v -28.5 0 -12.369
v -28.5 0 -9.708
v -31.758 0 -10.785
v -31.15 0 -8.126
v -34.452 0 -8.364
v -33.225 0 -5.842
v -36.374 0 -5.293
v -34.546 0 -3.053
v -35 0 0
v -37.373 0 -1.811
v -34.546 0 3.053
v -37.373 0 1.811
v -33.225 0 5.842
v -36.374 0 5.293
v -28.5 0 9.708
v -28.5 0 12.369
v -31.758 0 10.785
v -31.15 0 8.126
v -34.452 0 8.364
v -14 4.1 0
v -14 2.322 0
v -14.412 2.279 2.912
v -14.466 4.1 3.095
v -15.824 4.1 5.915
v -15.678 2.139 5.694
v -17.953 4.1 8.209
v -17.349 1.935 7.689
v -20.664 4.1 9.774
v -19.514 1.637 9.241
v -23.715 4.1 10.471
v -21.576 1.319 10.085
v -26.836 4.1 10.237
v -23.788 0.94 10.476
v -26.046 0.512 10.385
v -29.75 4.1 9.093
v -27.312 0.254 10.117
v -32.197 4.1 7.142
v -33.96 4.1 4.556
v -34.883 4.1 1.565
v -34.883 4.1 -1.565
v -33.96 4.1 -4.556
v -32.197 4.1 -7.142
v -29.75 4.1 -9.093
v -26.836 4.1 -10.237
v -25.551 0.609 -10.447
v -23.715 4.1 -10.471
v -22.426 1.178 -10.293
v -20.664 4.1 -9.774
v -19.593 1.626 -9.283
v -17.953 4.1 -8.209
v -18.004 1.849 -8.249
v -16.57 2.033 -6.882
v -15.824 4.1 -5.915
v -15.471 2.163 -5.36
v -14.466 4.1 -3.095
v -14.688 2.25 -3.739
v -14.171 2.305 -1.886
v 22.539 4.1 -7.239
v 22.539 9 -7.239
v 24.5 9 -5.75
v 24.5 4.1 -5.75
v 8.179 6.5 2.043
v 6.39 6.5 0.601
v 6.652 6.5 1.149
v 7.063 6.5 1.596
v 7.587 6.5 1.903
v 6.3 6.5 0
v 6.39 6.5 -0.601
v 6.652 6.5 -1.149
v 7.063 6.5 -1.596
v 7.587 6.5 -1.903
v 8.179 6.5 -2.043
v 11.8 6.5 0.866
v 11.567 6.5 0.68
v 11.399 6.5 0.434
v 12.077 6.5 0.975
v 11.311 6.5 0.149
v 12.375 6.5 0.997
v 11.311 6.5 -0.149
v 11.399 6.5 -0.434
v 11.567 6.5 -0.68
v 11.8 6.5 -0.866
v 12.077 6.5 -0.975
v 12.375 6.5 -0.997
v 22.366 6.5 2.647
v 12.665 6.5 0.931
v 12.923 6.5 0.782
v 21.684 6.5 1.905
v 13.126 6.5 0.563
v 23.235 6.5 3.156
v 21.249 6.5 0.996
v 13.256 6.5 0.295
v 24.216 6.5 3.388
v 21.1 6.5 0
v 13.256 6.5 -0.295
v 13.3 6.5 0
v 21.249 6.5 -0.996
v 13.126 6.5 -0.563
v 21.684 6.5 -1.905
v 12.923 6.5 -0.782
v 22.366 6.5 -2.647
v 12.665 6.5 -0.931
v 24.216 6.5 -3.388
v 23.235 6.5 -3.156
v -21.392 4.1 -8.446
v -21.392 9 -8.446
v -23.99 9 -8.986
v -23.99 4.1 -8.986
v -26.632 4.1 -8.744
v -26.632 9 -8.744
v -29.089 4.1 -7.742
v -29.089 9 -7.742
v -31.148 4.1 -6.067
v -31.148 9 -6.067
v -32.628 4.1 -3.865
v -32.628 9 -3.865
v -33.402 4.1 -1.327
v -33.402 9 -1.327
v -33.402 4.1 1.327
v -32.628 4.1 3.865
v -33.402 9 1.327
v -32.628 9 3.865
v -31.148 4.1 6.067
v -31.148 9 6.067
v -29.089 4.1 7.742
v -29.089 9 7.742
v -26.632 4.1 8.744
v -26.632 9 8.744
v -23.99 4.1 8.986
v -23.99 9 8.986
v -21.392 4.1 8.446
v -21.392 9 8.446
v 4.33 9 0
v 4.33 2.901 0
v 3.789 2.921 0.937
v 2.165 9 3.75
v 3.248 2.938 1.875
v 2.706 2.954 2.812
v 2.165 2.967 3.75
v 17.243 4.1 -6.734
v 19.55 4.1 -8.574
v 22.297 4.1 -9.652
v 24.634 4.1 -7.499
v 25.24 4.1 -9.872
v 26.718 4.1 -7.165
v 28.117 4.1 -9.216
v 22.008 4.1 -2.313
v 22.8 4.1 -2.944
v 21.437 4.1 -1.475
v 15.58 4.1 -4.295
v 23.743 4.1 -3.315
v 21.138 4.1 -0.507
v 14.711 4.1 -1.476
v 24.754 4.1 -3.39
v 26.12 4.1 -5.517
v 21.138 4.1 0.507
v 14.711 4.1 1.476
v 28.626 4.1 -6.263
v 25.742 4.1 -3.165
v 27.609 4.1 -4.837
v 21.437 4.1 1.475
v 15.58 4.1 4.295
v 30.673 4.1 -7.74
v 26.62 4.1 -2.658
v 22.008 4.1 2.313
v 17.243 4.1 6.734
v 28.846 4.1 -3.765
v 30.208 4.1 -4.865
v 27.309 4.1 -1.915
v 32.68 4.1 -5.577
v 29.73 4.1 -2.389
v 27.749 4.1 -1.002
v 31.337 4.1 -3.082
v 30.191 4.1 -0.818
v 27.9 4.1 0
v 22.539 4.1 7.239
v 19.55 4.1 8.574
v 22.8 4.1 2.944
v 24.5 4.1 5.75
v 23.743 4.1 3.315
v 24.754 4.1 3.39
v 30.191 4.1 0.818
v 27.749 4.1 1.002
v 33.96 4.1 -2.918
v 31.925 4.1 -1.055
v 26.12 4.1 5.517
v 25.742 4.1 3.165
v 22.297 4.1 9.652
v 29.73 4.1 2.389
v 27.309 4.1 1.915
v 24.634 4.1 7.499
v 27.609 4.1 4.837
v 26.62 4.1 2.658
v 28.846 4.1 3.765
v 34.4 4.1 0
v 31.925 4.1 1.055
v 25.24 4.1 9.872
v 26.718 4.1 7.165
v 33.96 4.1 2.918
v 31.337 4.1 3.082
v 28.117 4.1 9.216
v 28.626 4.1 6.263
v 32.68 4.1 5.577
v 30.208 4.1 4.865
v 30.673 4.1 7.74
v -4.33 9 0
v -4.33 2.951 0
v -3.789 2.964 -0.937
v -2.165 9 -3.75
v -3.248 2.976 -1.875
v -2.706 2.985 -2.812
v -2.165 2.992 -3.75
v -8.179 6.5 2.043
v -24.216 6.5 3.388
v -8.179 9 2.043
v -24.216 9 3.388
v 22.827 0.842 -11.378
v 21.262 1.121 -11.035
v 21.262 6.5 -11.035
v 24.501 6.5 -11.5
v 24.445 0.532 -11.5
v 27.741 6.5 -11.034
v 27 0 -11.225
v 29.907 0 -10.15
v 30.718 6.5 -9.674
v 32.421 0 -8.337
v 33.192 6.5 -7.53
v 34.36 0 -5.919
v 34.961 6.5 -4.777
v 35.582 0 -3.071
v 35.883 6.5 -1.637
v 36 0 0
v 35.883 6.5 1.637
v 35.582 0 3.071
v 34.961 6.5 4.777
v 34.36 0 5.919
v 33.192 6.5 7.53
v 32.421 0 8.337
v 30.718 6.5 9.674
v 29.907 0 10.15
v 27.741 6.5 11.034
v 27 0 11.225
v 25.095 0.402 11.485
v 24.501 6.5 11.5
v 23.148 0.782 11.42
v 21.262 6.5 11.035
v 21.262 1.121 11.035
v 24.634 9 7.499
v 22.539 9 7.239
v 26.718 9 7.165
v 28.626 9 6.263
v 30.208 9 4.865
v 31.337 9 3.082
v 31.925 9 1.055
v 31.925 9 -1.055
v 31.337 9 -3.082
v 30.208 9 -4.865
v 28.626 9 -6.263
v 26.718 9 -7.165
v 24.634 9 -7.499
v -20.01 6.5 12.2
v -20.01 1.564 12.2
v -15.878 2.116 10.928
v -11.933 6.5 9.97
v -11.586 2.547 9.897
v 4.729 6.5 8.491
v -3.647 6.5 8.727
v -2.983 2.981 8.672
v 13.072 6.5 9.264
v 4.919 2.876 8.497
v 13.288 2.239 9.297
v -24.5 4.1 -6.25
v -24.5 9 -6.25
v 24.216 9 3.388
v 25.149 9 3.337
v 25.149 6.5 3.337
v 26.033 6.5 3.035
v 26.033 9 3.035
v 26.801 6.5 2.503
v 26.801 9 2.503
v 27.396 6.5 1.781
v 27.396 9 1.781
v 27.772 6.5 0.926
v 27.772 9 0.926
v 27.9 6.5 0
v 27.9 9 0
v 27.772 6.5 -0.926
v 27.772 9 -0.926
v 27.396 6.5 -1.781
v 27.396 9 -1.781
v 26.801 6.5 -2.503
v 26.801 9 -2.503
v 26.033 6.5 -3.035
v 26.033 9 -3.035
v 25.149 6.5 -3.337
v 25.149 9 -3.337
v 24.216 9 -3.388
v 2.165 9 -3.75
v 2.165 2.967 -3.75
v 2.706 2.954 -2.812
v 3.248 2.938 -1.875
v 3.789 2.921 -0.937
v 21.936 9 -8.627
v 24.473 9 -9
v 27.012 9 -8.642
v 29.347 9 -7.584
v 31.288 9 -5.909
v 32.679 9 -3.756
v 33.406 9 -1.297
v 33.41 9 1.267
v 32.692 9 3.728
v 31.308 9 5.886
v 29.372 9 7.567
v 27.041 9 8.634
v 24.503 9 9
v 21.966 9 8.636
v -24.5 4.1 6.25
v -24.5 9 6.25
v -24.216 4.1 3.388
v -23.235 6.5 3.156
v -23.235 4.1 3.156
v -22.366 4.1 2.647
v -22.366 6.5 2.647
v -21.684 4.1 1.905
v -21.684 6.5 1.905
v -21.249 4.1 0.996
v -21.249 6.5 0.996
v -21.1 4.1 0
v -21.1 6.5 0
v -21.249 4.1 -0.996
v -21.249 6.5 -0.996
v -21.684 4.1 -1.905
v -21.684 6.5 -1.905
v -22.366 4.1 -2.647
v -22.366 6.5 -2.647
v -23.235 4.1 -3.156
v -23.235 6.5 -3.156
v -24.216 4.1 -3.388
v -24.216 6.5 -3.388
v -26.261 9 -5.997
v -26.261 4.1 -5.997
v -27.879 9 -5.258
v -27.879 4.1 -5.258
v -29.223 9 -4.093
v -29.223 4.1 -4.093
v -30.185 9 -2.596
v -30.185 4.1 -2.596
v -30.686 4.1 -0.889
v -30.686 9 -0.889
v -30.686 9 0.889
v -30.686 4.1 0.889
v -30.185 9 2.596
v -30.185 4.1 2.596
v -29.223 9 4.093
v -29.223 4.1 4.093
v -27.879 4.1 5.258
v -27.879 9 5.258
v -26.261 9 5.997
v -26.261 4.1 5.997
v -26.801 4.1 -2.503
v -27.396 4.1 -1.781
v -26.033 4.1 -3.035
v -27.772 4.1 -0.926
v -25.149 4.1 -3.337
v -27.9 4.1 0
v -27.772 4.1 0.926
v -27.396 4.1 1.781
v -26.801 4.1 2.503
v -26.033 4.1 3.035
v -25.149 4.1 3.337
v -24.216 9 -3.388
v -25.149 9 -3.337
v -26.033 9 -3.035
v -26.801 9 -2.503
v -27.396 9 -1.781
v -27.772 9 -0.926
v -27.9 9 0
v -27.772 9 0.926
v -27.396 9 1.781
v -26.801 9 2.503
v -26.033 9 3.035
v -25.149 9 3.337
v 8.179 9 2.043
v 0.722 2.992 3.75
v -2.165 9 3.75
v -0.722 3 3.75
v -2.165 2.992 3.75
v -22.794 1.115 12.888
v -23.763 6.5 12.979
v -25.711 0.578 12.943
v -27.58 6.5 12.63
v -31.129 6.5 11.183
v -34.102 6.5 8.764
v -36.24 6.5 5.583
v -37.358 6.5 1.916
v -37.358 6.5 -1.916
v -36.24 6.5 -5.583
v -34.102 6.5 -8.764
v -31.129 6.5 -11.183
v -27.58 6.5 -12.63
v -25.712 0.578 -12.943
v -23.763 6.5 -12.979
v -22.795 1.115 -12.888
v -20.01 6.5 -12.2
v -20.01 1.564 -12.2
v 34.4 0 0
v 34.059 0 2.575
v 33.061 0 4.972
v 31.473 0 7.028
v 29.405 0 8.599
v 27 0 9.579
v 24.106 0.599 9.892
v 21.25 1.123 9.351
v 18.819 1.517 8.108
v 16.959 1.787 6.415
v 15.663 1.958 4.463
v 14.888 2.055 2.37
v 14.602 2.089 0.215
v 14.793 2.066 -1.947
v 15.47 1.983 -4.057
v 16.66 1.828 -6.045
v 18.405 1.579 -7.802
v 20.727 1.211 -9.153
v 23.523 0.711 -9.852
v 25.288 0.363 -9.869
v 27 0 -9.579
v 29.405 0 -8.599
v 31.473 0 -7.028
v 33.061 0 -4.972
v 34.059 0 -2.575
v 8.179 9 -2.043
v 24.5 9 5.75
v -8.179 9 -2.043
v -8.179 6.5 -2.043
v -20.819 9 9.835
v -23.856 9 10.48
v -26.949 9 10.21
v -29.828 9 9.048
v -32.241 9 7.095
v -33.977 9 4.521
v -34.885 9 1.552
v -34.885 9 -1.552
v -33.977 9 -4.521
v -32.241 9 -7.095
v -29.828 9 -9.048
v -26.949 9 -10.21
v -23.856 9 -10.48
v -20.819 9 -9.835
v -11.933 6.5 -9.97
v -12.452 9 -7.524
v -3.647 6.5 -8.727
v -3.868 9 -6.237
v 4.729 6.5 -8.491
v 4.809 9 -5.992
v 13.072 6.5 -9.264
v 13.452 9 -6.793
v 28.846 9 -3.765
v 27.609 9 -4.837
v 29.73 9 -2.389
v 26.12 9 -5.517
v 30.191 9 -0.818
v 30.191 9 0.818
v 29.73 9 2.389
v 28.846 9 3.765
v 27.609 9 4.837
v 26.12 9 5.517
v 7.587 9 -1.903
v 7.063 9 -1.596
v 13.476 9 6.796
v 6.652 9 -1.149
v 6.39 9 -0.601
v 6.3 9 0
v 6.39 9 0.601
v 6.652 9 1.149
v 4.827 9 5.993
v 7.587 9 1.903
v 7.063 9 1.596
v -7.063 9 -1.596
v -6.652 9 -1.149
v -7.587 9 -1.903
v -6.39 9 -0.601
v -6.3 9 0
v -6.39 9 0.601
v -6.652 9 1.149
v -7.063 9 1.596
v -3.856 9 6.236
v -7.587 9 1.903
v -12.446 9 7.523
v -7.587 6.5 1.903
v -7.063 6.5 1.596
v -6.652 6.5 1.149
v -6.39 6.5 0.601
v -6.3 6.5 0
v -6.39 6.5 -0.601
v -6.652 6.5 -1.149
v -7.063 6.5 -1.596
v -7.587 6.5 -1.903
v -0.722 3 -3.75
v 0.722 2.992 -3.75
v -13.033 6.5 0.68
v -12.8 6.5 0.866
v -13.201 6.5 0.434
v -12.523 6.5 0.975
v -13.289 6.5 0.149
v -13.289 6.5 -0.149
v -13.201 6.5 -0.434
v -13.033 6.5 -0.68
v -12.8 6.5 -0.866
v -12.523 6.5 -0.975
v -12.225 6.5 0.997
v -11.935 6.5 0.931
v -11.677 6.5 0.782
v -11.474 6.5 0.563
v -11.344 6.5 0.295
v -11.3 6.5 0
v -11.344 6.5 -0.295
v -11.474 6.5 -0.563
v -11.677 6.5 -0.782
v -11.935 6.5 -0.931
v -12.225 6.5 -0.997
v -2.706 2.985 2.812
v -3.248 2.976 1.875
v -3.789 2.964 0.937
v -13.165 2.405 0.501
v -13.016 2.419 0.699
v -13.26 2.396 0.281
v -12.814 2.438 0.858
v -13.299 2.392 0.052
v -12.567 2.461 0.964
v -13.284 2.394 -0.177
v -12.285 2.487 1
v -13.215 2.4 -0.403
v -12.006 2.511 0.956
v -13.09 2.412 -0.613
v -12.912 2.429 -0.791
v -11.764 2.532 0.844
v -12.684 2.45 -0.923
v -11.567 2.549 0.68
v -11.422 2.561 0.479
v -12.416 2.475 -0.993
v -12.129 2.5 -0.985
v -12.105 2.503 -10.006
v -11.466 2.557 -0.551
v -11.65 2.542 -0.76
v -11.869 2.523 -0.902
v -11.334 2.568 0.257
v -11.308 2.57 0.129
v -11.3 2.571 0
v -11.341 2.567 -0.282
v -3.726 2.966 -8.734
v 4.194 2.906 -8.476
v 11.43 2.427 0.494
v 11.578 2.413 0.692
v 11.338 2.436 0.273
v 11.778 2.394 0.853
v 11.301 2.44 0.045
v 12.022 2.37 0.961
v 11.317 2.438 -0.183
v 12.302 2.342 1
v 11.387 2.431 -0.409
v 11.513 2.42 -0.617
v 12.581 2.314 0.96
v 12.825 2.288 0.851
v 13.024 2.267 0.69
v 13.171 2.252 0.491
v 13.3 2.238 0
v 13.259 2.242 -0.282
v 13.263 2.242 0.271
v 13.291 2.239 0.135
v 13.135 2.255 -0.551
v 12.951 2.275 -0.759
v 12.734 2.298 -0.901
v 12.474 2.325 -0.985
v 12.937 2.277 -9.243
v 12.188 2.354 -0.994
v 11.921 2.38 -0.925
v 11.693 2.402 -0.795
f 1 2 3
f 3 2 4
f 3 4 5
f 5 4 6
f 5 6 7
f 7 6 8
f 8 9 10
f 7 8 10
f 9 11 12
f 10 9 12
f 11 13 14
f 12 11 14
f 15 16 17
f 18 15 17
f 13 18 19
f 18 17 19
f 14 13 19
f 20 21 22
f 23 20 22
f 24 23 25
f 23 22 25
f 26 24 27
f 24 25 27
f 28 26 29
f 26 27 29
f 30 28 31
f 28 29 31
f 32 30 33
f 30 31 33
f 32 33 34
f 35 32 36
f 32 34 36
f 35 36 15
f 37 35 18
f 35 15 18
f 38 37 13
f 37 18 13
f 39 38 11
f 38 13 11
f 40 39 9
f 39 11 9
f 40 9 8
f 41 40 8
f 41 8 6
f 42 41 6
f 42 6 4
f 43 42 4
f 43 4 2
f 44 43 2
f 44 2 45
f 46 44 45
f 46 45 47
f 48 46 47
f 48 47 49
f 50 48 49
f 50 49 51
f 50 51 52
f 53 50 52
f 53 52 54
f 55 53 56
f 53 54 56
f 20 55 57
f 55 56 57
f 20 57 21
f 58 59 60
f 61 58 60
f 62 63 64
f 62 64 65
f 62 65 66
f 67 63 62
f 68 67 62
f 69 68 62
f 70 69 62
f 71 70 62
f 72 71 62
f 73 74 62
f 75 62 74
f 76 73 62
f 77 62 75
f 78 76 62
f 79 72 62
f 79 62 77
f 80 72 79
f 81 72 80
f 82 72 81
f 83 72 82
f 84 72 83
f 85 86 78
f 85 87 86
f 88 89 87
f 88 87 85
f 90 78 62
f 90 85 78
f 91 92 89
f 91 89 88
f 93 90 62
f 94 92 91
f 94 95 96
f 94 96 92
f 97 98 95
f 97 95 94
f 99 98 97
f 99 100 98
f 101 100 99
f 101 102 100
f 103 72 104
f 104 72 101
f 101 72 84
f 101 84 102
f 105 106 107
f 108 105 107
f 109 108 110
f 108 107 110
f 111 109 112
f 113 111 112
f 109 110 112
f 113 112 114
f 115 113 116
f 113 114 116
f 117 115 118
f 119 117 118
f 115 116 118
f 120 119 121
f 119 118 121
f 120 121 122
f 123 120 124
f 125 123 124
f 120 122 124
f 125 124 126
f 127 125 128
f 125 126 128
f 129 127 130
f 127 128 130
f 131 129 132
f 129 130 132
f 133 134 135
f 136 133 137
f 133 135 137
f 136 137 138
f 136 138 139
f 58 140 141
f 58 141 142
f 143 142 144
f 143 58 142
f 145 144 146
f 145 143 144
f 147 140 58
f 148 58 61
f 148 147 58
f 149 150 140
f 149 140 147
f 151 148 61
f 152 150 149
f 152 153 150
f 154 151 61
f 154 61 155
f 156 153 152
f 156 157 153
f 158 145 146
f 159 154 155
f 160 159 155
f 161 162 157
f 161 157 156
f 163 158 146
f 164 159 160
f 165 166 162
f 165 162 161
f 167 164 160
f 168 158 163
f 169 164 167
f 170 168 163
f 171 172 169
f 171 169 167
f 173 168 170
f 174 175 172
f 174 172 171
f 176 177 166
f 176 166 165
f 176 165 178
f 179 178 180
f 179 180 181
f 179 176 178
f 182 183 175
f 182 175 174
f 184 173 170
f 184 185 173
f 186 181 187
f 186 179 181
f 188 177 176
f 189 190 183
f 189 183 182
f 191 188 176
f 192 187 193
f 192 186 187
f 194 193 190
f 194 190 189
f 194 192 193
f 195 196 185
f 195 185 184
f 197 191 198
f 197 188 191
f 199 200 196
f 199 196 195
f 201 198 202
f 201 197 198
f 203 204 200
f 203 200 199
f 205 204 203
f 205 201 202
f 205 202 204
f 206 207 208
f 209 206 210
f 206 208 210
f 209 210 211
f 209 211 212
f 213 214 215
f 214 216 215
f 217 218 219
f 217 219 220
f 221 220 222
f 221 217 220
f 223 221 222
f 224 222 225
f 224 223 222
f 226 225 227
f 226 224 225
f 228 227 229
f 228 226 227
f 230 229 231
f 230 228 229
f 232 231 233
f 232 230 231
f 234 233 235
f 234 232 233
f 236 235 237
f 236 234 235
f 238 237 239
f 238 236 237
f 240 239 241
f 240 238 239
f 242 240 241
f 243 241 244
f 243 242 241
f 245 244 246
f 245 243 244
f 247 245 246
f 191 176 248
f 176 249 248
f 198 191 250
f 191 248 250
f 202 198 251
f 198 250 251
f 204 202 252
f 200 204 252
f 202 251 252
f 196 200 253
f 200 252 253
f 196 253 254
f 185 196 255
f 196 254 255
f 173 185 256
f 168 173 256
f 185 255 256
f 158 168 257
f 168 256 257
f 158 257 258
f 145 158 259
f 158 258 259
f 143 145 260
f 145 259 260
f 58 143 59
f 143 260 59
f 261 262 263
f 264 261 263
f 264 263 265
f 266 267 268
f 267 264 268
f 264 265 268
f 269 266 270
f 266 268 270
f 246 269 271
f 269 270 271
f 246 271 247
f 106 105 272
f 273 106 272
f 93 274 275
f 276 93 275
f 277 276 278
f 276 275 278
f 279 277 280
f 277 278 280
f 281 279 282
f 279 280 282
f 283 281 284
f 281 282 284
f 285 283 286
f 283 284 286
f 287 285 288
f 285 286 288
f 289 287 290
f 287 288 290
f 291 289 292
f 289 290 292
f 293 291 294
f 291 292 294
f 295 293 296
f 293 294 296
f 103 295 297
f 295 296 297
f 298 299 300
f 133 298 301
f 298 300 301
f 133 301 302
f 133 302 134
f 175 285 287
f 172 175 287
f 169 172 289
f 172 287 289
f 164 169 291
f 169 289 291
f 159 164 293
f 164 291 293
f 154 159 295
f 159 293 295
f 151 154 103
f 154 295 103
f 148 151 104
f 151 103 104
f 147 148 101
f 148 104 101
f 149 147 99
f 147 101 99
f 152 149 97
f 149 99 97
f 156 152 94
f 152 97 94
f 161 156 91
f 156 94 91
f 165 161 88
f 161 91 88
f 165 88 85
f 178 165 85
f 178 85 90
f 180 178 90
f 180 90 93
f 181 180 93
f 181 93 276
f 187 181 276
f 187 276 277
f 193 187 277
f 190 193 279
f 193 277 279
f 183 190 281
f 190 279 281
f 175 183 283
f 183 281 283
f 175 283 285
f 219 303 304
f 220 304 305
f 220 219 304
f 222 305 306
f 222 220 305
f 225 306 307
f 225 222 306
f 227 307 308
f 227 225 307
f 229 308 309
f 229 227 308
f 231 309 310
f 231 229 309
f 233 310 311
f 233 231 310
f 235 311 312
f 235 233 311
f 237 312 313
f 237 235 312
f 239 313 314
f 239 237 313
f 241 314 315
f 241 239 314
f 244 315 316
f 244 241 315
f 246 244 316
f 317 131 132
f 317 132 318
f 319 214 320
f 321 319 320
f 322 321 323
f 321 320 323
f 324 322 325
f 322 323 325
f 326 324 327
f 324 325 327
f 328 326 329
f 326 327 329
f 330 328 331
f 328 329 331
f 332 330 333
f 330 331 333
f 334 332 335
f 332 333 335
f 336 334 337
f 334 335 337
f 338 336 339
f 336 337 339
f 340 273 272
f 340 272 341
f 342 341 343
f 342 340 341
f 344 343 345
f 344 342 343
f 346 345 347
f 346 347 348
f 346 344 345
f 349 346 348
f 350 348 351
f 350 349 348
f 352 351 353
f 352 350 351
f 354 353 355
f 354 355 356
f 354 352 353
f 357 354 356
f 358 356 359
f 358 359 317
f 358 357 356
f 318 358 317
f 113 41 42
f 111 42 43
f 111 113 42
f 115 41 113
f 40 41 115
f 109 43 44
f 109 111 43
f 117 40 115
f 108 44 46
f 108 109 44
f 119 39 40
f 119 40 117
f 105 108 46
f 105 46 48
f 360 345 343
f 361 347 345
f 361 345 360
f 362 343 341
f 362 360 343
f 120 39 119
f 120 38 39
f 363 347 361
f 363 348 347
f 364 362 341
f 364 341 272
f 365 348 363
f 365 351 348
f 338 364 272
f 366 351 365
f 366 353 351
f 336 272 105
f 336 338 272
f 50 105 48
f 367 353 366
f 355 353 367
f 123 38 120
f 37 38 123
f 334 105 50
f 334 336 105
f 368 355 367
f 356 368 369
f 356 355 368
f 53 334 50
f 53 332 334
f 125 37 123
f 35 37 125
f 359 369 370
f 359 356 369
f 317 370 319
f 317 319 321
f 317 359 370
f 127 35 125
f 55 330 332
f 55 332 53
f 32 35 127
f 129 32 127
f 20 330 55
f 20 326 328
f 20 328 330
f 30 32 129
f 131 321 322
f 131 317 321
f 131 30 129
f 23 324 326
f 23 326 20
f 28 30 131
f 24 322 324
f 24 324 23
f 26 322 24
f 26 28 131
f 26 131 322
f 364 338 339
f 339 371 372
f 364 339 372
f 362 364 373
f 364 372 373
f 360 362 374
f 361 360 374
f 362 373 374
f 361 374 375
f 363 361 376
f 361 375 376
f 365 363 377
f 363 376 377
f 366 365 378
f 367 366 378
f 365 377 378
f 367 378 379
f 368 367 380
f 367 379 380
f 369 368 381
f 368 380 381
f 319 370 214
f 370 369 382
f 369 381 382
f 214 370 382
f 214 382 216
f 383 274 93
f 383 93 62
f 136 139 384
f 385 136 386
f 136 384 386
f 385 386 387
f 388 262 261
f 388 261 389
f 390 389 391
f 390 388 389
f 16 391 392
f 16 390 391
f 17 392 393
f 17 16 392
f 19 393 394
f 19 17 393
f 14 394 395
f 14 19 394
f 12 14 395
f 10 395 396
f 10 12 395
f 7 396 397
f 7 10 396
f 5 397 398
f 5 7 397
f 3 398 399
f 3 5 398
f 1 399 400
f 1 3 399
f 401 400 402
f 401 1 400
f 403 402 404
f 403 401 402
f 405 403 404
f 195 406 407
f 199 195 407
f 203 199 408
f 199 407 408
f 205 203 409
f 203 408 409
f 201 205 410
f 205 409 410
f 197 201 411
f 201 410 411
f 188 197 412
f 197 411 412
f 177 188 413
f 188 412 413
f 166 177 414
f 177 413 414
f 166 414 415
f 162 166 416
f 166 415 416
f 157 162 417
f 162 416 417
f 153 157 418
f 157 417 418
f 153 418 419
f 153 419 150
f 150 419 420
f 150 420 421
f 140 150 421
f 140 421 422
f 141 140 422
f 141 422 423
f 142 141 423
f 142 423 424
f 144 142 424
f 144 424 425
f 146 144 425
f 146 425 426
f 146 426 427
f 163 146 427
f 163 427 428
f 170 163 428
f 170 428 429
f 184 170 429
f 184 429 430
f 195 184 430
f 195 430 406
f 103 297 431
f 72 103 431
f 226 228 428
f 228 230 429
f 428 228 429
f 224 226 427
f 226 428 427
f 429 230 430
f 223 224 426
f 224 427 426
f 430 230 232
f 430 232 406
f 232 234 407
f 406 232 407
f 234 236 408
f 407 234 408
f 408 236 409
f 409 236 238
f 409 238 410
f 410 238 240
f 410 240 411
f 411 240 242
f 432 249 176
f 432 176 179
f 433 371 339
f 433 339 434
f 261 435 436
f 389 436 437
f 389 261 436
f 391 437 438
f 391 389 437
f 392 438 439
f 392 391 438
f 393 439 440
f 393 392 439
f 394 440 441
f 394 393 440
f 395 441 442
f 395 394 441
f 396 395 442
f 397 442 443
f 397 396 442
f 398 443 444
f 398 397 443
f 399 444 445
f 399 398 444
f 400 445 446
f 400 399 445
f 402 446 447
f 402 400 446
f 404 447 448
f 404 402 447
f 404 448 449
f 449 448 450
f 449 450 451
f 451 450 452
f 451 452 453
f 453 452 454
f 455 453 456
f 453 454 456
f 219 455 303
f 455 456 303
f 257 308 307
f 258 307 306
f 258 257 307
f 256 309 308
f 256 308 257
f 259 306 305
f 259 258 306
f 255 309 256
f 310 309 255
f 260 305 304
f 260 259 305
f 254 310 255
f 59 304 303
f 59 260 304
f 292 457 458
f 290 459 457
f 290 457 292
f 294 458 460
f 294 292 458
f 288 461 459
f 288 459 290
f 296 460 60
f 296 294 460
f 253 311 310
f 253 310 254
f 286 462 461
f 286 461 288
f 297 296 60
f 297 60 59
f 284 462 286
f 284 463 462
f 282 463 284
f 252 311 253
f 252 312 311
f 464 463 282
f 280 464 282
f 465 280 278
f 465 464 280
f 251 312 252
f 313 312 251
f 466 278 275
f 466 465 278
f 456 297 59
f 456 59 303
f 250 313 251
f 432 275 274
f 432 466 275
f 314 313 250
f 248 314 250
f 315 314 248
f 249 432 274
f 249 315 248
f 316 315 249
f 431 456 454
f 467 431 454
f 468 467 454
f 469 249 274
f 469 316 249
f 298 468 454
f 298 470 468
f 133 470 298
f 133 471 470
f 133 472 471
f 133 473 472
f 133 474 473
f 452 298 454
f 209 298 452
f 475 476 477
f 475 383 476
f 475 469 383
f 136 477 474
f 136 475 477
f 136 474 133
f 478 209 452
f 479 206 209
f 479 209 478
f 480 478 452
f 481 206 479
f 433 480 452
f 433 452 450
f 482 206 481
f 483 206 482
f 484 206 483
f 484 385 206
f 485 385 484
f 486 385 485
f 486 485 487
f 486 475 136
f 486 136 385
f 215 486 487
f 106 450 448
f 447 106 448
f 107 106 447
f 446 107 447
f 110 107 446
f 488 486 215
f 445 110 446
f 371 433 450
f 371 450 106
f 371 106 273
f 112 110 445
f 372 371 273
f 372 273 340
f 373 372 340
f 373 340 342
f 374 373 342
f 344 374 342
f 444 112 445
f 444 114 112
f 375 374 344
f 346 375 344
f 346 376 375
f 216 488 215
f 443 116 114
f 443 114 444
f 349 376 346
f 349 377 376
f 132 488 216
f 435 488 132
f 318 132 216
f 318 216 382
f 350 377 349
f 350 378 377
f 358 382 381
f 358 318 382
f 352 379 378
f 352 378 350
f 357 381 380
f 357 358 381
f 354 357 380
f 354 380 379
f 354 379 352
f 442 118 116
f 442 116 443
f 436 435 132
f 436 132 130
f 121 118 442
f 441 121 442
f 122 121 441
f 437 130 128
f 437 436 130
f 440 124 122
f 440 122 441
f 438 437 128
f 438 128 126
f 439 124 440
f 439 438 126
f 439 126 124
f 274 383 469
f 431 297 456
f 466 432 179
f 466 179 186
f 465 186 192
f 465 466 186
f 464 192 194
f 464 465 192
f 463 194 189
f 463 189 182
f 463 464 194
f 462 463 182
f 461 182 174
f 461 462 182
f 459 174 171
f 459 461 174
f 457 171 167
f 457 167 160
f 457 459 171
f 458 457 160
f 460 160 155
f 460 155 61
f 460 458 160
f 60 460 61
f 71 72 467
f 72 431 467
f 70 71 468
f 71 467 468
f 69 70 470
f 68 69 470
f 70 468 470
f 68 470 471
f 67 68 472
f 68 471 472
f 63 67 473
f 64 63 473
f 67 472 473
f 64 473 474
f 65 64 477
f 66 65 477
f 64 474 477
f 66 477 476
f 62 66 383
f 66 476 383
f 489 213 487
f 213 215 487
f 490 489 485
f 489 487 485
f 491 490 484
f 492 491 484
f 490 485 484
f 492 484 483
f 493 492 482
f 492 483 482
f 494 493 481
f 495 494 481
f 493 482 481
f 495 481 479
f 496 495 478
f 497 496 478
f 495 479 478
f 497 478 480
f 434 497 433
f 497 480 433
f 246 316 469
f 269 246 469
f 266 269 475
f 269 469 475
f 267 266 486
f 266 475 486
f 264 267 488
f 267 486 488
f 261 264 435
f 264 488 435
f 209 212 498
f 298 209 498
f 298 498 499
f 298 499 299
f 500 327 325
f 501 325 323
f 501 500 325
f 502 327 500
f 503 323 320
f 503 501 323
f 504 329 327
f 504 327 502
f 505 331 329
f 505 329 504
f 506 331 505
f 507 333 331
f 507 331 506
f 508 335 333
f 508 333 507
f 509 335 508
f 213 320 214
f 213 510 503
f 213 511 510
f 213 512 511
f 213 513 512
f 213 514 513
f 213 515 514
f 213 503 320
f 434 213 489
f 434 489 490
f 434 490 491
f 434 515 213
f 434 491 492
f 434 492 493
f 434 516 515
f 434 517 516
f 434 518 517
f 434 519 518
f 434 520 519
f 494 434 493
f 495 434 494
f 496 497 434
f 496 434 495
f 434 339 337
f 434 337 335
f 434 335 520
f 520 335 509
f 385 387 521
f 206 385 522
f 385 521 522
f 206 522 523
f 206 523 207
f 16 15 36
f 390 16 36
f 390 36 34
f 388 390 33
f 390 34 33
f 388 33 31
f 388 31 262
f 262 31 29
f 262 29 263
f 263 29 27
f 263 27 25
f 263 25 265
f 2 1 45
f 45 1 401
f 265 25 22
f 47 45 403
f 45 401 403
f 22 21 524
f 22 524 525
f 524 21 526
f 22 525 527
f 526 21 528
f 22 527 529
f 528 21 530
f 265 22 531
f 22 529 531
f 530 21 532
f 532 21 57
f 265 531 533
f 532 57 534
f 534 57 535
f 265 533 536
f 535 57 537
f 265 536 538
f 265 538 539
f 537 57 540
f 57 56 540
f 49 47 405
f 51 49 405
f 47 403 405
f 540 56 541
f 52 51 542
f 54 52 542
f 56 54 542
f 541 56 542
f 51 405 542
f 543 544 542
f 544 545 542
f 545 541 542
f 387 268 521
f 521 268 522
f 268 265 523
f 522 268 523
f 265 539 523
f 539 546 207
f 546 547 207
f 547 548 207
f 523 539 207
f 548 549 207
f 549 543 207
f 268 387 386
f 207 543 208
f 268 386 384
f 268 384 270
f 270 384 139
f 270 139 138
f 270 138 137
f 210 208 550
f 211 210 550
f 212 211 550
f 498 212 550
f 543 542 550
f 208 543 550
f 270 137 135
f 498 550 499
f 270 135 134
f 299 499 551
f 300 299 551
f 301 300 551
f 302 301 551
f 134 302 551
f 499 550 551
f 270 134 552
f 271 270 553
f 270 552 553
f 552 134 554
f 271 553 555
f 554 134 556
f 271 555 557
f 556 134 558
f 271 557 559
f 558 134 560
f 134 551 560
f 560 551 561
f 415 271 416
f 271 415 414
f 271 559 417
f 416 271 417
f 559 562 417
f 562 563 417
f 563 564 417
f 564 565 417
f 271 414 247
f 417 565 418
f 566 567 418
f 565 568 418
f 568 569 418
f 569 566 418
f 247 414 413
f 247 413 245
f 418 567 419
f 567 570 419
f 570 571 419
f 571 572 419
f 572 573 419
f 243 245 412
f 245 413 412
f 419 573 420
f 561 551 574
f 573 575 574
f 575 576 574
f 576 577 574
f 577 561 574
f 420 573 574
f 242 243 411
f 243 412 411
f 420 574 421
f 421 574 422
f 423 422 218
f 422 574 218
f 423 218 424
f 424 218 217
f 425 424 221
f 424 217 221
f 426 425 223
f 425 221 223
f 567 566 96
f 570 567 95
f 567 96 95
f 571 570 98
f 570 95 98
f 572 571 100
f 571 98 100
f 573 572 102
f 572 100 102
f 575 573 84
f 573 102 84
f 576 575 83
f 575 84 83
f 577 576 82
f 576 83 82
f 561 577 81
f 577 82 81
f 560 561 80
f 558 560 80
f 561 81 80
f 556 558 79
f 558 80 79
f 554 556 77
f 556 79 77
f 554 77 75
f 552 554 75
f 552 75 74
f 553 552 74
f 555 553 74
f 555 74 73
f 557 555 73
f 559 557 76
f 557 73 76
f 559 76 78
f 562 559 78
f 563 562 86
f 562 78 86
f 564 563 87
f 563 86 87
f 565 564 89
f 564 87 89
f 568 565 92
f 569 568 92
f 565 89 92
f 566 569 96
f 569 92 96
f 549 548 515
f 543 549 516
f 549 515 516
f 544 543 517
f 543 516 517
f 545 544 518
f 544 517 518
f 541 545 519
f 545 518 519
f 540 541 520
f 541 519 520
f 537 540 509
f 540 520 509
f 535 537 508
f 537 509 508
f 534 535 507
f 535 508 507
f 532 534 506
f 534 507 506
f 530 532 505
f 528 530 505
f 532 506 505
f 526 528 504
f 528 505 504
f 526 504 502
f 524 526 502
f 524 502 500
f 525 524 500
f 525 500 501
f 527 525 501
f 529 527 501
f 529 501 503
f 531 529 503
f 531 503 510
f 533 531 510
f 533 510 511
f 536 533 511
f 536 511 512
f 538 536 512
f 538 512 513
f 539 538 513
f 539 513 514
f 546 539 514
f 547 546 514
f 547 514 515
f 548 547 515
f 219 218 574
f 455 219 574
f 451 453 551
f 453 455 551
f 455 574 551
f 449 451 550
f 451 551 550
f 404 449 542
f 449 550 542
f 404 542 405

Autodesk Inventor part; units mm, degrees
ref_plane "YZ Plane" through (0, 0, 0) normal (1, 0, 0) x (0, 1, 0)
ref_plane "XZ Plane" through (0, 0, 0) normal (0, 1, 0) x (-1, 0, 0)
ref_plane "XY Plane" through (0, 0, 0) normal (0, 0, 1) x (1, 0, 0)
sketch "Boceto1" plane through (0, 0, 0) normal (0, 1, 0) x (-1, 0, 0)
  arc A0 (20.01, -12.2) -> (20.01, 12.2) centre (24.5, 0) ccw
  arc A1 (-21.2615, 11.0346) -> (-21.2615, -11.0346) centre (-24.5, 0) ccw
  line L0 (-2.1651, 3.75) -> (2.1651, 3.75)
  line L1 (2.1651, 3.75) -> (4.3301, 0)
  line L2 (4.3301, 0) -> (2.1651, -3.75)
  line L3 (2.1651, -3.75) -> (-2.1651, -3.75)
  line L4 (-2.1651, -3.75) -> (-4.3301, 0)
  line L5 (-4.3301, 0) -> (-2.1651, 3.75)
  line L6 (0, 0) -> (0, 8.5) construction
  line L7 (0, 0) -> (0, -8.5) construction
  line L8 (0, 0) -> (2.6275, 0) construction
  arc A2 (20.01, -12.2) -> (-21.4933, -11.1) centre (-2.4996, -77.9761) ccw
  arc A3 (-21.4933, 11.1) -> (20.01, 12.2) centre (-2.4996, 77.9761) ccw
  arc A4 (20.01, 12.2) -> (20.01, -12.2) centre (24.5, 0) ccw construction
  arc A5 (-21.2615, -11.0346) -> (-21.2615, 11.0346) centre (-24.5, 0) ccw construction
  point P0 (-21.4933, 11.1)
  dimension "d2" = 7.5
  dimension "d3" = 49
  dimension "d4" = 8.5
  dimension "d5" = 8.5
  dimension "d6" = 26
  dimension "d7" = 23
  dimension "d12" = 12.2
  dimension "d13" = 11.1
extrude "Extrusión1" add sketch "Boceto1" along normal blind 9
sketch "Boceto2" plane through (0, 9, 0) normal (0, 1, 0) x (1, 0, 0)
  arc A0 (-20.01, 12.2) -> (-20.01, -12.2) centre (-24.5, 0) ccw projected
  arc A1 (21.4933, -11.1) -> (21.4933, 11.1) centre (24.5, 0) ccw projected
  arc A2 (-24.5, 6.25) -> (-24.5, -6.25) centre (-24.5, 0) ccw
  arc A3 (24.5, -5.75) -> (24.5, 5.75) centre (24.5, 0) ccw
  arc A4 (-21.3915, 8.4462) -> (-21.3915, -8.4462) centre (-24.5, 0) ccw
  arc A5 (22.5391, -7.2391) -> (22.5391, 7.2391) centre (24.5, 0) ccw
  line L0 (-21.3915, 8.4462) -> (-24.5, 6.25)
  line L1 (-21.3915, -8.4462) -> (-24.5, -6.25)
  arc A6 (-24.5, -6.25) -> (-24.5, 6.25) centre (-24.5, 0) ccw construction
  line L2 (22.5391, 7.2391) -> (24.5, 5.75)
  line L3 (22.5391, -7.2391) -> (24.5, -5.75)
  arc A7 (24.5, 5.75) -> (24.5, -5.75) centre (24.5, 0) ccw construction
  point P0 (0, 0)
  dimension "d16" = 12.5
  dimension "d17" = 11.5
  dimension "d18" = 4
  dimension "d19" = 4
extrude "Extrusión2" cut sketch "Boceto2" against normal up to surface (9 mm away)
sketch "Boceto3" plane through (0, 9, 0) normal (0, 1, 0) x (1, 0, 0)
  arc A0 (-24.5, 6.25) -> (-24.5, -6.25) centre (-24.5, 0) ccw projected
  arc A1 (24.5, -5.75) -> (24.5, 5.75) centre (24.5, 0) ccw projected
  arc A2 (-24.2158, 3.3881) -> (-24.2158, -3.3881) centre (-24.5, 0) ccw
  arc A3 (-8.1786, -2.0428) -> (-8.1786, 2.0428) centre (-8.35, 0) ccw
  line L0 (-27.9, 3.184) -> (-27.9, -2.3152) construction
  line L1 (-6.3, 2.5123) -> (-6.3, -1.5596) construction
  line L2 (0, 0) -> (0, -2.3152) construction
  line L3 (-24.2158, 3.3881) -> (-8.1786, 2.0428)
  line L4 (-24.2158, -3.3881) -> (-8.1786, -2.0428)
  arc A4 (24.2158, -3.3881) -> (24.2158, 3.3881) centre (24.5, 0) ccw
  arc A5 (8.1786, 2.0428) -> (8.1786, -2.0428) centre (8.35, 0) ccw
  line L5 (24.2158, 3.3881) -> (8.1786, 2.0428)
  line L6 (24.2158, -3.3881) -> (8.1786, -2.0428)
  arc A6 (-24.2158, -3.3881) -> (-24.2158, 3.3881) centre (-24.5, 0) ccw construction
  arc A7 (-8.1786, 2.0428) -> (-8.1786, -2.0428) centre (-8.35, 0) ccw construction
  arc A8 (8.1786, -2.0428) -> (8.1786, 2.0428) centre (8.35, 0) ccw construction
  arc A9 (24.2158, 3.3881) -> (24.2158, -3.3881) centre (24.5, 0) ccw construction
  dimension "d22" = 6.8
  dimension "d28" = 4.1
  dimension "d30" = 21.6
extrude "Extrusión3" cut sketch "Boceto3" against normal blind 2.5
sketch "Boceto4" plane through (0, 6.5, 0) normal (0, 1, 0) x (1, 0, 0)
  arc A0 (-24.2158, 3.3881) -> (-24.2158, -3.3881) centre (-24.5, 0) ccw projected
  line L0 (0, 0) -> (0, -3.3881) construction
  arc A1 (-24.2158, 3.3881) -> (-24.2158, -3.3881) centre (-24.5, 0) ccw projected
  circle A2 centre (-24.5, 0) radius 3.4
  circle A3 centre (-12.3, 0) radius 1
  circle A4 centre (24.5, 0) radius 3.4
  circle A5 centre (12.3, 0) radius 1
  point P0 (-24.2158, -3.3881)
  dimension "d33" = 6.8
  dimension "d34" = 2
  dimension "d35" = 12.2
extrude "Extrusión4" cut sketch "Boceto4" against normal up to surface (6.5 mm away)
sketch "Boceto5" plane through (0, 0, 0) normal (0, -1, 0) x (1, 0, 0)
  circle A0 centre (24.5, 0) radius 3.4 projected
  circle A1 centre (-24.5, 0) radius 3.4 projected
  circle A2 centre (24.5, 0) radius 9.9
  circle A3 centre (-24.5, 0) radius 10.5
  point P0 (0, 0)
  dimension "d38" = 19.8
  dimension "d39" = 21
extrude "Extrusión5" cut sketch "Boceto5" against normal blind 4.1 contours A0 | A1 | A2 | A3
sketch "Boceto6" plane through (0, 0, 0) normal (0, 0, 1) x (1, 0, 0)
  line L0 (-20.01, 9) -> (21.4933, 9) projected
  line L1 (2.1651, 9) -> (-2.1651, 9) projected
  line L2 (0, 9) -> (0, 11.4954) construction
  line L3 (-37.5, 0) -> (-37.5, 9) projected
  line L4 (36, 0) -> (36, 9) projected
  line L5 (36, 0) -> (21.4933, 0) projected
  line L6 (-20.01, 0) -> (-37.5, 0) projected
  arc A0 (27, 0) -> (-28.5, 0) centre (-0.75, -126.8438) ccw
  line L7 (-9.6072, 3) -> (8.7031, 3) construction
  line L8 (-28.5, 0) -> (27, 0)
  line L9 (-20.01, 0) -> (21.4933, 0) projected
  point P0 (0, 0)
  dimension "d42" = 9
  dimension "d43" = 9
  dimension "d44" = 6
extrude "Extrusión6" cut sketch "Boceto6" along normal through all both and the other way through all
chamfer "Chaflán1" distance 2.5 angle 45 4 edges at (0.6576, 9, -8.4795) (-37.5, 9, 0) (0.6576, 9, 8.4795) (36, 9, 0)
properties part number "Femur_V2"
